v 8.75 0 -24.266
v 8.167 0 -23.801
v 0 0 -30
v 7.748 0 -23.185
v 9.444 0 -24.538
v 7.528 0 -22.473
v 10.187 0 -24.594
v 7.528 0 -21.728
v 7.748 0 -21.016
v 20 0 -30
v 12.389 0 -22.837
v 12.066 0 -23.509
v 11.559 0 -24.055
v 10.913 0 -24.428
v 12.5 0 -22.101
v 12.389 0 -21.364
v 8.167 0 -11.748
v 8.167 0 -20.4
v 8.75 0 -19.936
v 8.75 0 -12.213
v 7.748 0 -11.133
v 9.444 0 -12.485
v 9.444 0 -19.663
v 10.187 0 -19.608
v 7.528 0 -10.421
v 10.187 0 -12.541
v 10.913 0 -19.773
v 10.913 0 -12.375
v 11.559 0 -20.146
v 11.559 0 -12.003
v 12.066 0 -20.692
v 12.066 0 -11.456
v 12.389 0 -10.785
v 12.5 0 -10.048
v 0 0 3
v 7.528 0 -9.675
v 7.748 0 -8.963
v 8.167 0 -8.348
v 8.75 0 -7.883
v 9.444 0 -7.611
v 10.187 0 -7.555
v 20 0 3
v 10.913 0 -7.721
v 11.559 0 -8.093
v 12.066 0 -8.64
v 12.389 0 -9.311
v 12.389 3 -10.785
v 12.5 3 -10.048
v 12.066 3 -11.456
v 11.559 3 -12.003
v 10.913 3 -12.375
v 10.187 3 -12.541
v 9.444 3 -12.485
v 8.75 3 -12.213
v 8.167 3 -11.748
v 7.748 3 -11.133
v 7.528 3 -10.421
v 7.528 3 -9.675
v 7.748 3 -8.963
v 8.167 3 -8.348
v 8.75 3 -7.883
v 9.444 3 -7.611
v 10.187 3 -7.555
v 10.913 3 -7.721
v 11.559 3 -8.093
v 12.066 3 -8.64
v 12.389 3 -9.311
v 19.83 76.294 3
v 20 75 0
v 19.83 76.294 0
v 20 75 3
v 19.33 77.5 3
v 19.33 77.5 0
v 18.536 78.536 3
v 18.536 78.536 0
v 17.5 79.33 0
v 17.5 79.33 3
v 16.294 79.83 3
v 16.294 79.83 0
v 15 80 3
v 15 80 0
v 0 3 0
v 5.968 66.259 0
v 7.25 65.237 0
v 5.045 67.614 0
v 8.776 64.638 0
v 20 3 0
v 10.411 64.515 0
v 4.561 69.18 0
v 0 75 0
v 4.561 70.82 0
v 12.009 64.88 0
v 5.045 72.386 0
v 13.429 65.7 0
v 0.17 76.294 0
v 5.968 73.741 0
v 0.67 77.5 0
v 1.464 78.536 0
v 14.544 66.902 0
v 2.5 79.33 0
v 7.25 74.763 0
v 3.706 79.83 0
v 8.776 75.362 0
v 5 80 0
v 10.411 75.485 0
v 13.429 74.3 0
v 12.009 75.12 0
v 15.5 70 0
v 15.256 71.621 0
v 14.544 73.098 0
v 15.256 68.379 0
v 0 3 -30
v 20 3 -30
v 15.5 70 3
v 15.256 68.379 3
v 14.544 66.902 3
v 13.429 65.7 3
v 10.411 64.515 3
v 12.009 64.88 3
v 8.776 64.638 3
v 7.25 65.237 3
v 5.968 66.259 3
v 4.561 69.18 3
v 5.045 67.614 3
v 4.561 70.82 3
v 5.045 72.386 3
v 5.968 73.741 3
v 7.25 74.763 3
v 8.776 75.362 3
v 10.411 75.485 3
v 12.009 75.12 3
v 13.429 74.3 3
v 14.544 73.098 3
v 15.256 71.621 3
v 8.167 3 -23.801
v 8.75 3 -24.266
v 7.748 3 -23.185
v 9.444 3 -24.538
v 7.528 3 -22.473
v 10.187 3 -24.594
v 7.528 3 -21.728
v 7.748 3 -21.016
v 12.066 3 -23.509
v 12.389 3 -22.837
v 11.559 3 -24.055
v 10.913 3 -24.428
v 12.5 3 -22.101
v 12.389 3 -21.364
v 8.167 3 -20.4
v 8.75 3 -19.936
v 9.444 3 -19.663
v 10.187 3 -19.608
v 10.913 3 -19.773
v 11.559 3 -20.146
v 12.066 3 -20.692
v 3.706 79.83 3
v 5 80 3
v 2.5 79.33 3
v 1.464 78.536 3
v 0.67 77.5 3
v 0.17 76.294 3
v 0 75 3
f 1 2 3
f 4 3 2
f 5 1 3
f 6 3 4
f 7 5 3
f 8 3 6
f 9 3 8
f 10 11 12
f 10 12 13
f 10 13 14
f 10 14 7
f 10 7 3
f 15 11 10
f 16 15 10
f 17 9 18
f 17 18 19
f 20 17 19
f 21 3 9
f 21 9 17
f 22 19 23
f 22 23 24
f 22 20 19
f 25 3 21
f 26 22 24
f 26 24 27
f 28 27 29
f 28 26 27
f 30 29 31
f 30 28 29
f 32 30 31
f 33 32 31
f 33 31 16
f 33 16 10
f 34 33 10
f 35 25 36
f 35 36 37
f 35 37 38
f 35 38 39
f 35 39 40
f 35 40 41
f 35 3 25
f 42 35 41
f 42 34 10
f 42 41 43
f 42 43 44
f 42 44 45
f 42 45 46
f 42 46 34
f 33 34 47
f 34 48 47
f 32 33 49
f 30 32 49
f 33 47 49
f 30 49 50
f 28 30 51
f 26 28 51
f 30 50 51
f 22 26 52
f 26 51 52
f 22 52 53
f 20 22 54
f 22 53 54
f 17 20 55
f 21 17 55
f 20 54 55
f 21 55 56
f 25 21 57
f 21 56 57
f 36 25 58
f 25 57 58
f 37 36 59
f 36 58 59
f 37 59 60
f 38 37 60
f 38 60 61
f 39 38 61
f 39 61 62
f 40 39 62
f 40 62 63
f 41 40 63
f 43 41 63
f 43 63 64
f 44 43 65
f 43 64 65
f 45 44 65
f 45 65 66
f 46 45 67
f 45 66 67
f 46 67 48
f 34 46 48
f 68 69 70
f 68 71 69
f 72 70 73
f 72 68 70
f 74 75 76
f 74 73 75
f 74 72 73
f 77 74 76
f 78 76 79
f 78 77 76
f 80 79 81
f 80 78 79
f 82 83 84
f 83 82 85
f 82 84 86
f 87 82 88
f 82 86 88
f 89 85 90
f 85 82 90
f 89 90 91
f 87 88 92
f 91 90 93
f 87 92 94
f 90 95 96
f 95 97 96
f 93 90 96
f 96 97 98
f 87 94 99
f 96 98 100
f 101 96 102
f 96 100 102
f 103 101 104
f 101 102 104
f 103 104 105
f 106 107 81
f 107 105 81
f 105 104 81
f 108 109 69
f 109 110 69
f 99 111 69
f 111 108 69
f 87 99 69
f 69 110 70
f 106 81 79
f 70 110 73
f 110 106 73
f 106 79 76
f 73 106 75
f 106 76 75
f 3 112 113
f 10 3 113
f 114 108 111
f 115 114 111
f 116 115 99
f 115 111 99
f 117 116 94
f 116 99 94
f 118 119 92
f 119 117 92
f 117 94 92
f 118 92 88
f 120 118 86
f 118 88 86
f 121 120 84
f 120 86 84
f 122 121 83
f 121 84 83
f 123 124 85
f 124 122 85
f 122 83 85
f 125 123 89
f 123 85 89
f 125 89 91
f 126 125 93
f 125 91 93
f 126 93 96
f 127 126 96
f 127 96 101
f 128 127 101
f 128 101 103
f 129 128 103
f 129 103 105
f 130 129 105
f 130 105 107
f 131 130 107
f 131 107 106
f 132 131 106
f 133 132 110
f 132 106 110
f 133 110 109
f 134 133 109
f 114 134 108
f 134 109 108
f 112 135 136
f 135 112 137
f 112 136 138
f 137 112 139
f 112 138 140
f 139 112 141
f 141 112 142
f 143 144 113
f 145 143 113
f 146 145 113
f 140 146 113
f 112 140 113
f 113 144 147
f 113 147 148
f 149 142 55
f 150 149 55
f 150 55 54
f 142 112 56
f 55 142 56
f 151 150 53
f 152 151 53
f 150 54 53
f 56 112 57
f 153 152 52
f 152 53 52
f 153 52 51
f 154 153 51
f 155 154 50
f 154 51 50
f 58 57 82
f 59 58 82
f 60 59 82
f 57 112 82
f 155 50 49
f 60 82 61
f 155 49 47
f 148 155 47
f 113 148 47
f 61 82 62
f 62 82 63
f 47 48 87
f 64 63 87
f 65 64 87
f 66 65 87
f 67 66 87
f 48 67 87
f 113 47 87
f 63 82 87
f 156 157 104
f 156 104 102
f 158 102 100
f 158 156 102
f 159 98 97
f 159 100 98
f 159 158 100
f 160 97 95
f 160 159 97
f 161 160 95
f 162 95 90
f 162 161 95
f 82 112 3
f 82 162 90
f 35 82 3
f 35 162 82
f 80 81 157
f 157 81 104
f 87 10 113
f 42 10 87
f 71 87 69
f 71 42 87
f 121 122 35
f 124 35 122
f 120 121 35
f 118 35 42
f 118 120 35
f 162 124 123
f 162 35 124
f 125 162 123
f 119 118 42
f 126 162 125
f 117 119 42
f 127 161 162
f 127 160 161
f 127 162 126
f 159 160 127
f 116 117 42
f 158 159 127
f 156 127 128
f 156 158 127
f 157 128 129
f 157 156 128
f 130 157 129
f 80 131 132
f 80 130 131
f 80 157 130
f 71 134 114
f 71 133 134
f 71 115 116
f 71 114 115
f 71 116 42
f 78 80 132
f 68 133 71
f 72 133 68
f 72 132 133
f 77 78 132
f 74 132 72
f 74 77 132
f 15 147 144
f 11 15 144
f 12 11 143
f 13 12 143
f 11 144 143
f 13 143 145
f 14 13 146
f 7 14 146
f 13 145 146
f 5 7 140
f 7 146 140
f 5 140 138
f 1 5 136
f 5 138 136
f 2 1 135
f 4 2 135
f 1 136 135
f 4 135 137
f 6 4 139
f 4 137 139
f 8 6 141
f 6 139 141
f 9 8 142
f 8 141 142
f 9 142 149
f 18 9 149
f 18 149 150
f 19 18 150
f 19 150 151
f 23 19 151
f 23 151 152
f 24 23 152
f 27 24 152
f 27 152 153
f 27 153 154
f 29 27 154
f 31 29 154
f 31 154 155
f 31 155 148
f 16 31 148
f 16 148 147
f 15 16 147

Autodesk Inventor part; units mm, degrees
ref_plane "YZ Plane" through (0, 0, 0) normal (1, 0, 0) x (0, 1, 0)
ref_plane "XZ Plane" through (0, 0, 0) normal (0, 1, 0) x (-1, 0, 0)
ref_plane "XY Plane" through (0, 0, 0) normal (0, 0, 1) x (1, 0, 0)
sketch "Sketch1" plane through (0, 0, 0) normal (0, 0, 1) x (1, 0, 0)
  line L0 (0, 0) -> (20, 0)
  line L1 (20, 0) -> (20, 80)
  line L2 (20, 80) -> (0, 80)
  line L3 (0, 80) -> (0, 0)
  circle A0 centre (10, 70) radius 5.5
  line L4 (20, 0) -> (0, 0)
  line L5 (0, 0) -> (0, 3)
  line L6 (0, 3) -> (20, 3)
  line L7 (20, 3) -> (20, 0)
  point P0 (10, 0)
  dimension "d0" = 20
  dimension "d1" = 80
  dimension "d2" = 11
  dimension "d3" = 70
  dimension "d7" = 3
extrude "Extrusion1" add sketch "Sketch1" along normal blind 3
fillet "Fillet1" radius 5 2 edges at (20, 80, 1.5) (0, 80, 1.5)
extrude "Extrusion2" add sketch "Sketch1" against normal blind 30 contours L3 L6 L1 L0
sketch "Sketch2" plane through (0, 3, 0) normal (0, 1, 0) x (1, 0, 0)
  circle A0 centre (10, 22.1006) radius 2.5
  circle A1 centre (10, 10.048) radius 2.5
  point P0 (0, 0)
  dimension "d10" = 5
  dimension "d11" = 5
extrude "Extrusion3" cut sketch "Sketch2" against normal through all
extrude "Extrusion4" cut sketch "Sketch1" along normal blind 10 contours A0
extrude "Extrusion5" cut sketch "Sketch1" along normal blind 10 contours A0
properties part number "roll stand"
